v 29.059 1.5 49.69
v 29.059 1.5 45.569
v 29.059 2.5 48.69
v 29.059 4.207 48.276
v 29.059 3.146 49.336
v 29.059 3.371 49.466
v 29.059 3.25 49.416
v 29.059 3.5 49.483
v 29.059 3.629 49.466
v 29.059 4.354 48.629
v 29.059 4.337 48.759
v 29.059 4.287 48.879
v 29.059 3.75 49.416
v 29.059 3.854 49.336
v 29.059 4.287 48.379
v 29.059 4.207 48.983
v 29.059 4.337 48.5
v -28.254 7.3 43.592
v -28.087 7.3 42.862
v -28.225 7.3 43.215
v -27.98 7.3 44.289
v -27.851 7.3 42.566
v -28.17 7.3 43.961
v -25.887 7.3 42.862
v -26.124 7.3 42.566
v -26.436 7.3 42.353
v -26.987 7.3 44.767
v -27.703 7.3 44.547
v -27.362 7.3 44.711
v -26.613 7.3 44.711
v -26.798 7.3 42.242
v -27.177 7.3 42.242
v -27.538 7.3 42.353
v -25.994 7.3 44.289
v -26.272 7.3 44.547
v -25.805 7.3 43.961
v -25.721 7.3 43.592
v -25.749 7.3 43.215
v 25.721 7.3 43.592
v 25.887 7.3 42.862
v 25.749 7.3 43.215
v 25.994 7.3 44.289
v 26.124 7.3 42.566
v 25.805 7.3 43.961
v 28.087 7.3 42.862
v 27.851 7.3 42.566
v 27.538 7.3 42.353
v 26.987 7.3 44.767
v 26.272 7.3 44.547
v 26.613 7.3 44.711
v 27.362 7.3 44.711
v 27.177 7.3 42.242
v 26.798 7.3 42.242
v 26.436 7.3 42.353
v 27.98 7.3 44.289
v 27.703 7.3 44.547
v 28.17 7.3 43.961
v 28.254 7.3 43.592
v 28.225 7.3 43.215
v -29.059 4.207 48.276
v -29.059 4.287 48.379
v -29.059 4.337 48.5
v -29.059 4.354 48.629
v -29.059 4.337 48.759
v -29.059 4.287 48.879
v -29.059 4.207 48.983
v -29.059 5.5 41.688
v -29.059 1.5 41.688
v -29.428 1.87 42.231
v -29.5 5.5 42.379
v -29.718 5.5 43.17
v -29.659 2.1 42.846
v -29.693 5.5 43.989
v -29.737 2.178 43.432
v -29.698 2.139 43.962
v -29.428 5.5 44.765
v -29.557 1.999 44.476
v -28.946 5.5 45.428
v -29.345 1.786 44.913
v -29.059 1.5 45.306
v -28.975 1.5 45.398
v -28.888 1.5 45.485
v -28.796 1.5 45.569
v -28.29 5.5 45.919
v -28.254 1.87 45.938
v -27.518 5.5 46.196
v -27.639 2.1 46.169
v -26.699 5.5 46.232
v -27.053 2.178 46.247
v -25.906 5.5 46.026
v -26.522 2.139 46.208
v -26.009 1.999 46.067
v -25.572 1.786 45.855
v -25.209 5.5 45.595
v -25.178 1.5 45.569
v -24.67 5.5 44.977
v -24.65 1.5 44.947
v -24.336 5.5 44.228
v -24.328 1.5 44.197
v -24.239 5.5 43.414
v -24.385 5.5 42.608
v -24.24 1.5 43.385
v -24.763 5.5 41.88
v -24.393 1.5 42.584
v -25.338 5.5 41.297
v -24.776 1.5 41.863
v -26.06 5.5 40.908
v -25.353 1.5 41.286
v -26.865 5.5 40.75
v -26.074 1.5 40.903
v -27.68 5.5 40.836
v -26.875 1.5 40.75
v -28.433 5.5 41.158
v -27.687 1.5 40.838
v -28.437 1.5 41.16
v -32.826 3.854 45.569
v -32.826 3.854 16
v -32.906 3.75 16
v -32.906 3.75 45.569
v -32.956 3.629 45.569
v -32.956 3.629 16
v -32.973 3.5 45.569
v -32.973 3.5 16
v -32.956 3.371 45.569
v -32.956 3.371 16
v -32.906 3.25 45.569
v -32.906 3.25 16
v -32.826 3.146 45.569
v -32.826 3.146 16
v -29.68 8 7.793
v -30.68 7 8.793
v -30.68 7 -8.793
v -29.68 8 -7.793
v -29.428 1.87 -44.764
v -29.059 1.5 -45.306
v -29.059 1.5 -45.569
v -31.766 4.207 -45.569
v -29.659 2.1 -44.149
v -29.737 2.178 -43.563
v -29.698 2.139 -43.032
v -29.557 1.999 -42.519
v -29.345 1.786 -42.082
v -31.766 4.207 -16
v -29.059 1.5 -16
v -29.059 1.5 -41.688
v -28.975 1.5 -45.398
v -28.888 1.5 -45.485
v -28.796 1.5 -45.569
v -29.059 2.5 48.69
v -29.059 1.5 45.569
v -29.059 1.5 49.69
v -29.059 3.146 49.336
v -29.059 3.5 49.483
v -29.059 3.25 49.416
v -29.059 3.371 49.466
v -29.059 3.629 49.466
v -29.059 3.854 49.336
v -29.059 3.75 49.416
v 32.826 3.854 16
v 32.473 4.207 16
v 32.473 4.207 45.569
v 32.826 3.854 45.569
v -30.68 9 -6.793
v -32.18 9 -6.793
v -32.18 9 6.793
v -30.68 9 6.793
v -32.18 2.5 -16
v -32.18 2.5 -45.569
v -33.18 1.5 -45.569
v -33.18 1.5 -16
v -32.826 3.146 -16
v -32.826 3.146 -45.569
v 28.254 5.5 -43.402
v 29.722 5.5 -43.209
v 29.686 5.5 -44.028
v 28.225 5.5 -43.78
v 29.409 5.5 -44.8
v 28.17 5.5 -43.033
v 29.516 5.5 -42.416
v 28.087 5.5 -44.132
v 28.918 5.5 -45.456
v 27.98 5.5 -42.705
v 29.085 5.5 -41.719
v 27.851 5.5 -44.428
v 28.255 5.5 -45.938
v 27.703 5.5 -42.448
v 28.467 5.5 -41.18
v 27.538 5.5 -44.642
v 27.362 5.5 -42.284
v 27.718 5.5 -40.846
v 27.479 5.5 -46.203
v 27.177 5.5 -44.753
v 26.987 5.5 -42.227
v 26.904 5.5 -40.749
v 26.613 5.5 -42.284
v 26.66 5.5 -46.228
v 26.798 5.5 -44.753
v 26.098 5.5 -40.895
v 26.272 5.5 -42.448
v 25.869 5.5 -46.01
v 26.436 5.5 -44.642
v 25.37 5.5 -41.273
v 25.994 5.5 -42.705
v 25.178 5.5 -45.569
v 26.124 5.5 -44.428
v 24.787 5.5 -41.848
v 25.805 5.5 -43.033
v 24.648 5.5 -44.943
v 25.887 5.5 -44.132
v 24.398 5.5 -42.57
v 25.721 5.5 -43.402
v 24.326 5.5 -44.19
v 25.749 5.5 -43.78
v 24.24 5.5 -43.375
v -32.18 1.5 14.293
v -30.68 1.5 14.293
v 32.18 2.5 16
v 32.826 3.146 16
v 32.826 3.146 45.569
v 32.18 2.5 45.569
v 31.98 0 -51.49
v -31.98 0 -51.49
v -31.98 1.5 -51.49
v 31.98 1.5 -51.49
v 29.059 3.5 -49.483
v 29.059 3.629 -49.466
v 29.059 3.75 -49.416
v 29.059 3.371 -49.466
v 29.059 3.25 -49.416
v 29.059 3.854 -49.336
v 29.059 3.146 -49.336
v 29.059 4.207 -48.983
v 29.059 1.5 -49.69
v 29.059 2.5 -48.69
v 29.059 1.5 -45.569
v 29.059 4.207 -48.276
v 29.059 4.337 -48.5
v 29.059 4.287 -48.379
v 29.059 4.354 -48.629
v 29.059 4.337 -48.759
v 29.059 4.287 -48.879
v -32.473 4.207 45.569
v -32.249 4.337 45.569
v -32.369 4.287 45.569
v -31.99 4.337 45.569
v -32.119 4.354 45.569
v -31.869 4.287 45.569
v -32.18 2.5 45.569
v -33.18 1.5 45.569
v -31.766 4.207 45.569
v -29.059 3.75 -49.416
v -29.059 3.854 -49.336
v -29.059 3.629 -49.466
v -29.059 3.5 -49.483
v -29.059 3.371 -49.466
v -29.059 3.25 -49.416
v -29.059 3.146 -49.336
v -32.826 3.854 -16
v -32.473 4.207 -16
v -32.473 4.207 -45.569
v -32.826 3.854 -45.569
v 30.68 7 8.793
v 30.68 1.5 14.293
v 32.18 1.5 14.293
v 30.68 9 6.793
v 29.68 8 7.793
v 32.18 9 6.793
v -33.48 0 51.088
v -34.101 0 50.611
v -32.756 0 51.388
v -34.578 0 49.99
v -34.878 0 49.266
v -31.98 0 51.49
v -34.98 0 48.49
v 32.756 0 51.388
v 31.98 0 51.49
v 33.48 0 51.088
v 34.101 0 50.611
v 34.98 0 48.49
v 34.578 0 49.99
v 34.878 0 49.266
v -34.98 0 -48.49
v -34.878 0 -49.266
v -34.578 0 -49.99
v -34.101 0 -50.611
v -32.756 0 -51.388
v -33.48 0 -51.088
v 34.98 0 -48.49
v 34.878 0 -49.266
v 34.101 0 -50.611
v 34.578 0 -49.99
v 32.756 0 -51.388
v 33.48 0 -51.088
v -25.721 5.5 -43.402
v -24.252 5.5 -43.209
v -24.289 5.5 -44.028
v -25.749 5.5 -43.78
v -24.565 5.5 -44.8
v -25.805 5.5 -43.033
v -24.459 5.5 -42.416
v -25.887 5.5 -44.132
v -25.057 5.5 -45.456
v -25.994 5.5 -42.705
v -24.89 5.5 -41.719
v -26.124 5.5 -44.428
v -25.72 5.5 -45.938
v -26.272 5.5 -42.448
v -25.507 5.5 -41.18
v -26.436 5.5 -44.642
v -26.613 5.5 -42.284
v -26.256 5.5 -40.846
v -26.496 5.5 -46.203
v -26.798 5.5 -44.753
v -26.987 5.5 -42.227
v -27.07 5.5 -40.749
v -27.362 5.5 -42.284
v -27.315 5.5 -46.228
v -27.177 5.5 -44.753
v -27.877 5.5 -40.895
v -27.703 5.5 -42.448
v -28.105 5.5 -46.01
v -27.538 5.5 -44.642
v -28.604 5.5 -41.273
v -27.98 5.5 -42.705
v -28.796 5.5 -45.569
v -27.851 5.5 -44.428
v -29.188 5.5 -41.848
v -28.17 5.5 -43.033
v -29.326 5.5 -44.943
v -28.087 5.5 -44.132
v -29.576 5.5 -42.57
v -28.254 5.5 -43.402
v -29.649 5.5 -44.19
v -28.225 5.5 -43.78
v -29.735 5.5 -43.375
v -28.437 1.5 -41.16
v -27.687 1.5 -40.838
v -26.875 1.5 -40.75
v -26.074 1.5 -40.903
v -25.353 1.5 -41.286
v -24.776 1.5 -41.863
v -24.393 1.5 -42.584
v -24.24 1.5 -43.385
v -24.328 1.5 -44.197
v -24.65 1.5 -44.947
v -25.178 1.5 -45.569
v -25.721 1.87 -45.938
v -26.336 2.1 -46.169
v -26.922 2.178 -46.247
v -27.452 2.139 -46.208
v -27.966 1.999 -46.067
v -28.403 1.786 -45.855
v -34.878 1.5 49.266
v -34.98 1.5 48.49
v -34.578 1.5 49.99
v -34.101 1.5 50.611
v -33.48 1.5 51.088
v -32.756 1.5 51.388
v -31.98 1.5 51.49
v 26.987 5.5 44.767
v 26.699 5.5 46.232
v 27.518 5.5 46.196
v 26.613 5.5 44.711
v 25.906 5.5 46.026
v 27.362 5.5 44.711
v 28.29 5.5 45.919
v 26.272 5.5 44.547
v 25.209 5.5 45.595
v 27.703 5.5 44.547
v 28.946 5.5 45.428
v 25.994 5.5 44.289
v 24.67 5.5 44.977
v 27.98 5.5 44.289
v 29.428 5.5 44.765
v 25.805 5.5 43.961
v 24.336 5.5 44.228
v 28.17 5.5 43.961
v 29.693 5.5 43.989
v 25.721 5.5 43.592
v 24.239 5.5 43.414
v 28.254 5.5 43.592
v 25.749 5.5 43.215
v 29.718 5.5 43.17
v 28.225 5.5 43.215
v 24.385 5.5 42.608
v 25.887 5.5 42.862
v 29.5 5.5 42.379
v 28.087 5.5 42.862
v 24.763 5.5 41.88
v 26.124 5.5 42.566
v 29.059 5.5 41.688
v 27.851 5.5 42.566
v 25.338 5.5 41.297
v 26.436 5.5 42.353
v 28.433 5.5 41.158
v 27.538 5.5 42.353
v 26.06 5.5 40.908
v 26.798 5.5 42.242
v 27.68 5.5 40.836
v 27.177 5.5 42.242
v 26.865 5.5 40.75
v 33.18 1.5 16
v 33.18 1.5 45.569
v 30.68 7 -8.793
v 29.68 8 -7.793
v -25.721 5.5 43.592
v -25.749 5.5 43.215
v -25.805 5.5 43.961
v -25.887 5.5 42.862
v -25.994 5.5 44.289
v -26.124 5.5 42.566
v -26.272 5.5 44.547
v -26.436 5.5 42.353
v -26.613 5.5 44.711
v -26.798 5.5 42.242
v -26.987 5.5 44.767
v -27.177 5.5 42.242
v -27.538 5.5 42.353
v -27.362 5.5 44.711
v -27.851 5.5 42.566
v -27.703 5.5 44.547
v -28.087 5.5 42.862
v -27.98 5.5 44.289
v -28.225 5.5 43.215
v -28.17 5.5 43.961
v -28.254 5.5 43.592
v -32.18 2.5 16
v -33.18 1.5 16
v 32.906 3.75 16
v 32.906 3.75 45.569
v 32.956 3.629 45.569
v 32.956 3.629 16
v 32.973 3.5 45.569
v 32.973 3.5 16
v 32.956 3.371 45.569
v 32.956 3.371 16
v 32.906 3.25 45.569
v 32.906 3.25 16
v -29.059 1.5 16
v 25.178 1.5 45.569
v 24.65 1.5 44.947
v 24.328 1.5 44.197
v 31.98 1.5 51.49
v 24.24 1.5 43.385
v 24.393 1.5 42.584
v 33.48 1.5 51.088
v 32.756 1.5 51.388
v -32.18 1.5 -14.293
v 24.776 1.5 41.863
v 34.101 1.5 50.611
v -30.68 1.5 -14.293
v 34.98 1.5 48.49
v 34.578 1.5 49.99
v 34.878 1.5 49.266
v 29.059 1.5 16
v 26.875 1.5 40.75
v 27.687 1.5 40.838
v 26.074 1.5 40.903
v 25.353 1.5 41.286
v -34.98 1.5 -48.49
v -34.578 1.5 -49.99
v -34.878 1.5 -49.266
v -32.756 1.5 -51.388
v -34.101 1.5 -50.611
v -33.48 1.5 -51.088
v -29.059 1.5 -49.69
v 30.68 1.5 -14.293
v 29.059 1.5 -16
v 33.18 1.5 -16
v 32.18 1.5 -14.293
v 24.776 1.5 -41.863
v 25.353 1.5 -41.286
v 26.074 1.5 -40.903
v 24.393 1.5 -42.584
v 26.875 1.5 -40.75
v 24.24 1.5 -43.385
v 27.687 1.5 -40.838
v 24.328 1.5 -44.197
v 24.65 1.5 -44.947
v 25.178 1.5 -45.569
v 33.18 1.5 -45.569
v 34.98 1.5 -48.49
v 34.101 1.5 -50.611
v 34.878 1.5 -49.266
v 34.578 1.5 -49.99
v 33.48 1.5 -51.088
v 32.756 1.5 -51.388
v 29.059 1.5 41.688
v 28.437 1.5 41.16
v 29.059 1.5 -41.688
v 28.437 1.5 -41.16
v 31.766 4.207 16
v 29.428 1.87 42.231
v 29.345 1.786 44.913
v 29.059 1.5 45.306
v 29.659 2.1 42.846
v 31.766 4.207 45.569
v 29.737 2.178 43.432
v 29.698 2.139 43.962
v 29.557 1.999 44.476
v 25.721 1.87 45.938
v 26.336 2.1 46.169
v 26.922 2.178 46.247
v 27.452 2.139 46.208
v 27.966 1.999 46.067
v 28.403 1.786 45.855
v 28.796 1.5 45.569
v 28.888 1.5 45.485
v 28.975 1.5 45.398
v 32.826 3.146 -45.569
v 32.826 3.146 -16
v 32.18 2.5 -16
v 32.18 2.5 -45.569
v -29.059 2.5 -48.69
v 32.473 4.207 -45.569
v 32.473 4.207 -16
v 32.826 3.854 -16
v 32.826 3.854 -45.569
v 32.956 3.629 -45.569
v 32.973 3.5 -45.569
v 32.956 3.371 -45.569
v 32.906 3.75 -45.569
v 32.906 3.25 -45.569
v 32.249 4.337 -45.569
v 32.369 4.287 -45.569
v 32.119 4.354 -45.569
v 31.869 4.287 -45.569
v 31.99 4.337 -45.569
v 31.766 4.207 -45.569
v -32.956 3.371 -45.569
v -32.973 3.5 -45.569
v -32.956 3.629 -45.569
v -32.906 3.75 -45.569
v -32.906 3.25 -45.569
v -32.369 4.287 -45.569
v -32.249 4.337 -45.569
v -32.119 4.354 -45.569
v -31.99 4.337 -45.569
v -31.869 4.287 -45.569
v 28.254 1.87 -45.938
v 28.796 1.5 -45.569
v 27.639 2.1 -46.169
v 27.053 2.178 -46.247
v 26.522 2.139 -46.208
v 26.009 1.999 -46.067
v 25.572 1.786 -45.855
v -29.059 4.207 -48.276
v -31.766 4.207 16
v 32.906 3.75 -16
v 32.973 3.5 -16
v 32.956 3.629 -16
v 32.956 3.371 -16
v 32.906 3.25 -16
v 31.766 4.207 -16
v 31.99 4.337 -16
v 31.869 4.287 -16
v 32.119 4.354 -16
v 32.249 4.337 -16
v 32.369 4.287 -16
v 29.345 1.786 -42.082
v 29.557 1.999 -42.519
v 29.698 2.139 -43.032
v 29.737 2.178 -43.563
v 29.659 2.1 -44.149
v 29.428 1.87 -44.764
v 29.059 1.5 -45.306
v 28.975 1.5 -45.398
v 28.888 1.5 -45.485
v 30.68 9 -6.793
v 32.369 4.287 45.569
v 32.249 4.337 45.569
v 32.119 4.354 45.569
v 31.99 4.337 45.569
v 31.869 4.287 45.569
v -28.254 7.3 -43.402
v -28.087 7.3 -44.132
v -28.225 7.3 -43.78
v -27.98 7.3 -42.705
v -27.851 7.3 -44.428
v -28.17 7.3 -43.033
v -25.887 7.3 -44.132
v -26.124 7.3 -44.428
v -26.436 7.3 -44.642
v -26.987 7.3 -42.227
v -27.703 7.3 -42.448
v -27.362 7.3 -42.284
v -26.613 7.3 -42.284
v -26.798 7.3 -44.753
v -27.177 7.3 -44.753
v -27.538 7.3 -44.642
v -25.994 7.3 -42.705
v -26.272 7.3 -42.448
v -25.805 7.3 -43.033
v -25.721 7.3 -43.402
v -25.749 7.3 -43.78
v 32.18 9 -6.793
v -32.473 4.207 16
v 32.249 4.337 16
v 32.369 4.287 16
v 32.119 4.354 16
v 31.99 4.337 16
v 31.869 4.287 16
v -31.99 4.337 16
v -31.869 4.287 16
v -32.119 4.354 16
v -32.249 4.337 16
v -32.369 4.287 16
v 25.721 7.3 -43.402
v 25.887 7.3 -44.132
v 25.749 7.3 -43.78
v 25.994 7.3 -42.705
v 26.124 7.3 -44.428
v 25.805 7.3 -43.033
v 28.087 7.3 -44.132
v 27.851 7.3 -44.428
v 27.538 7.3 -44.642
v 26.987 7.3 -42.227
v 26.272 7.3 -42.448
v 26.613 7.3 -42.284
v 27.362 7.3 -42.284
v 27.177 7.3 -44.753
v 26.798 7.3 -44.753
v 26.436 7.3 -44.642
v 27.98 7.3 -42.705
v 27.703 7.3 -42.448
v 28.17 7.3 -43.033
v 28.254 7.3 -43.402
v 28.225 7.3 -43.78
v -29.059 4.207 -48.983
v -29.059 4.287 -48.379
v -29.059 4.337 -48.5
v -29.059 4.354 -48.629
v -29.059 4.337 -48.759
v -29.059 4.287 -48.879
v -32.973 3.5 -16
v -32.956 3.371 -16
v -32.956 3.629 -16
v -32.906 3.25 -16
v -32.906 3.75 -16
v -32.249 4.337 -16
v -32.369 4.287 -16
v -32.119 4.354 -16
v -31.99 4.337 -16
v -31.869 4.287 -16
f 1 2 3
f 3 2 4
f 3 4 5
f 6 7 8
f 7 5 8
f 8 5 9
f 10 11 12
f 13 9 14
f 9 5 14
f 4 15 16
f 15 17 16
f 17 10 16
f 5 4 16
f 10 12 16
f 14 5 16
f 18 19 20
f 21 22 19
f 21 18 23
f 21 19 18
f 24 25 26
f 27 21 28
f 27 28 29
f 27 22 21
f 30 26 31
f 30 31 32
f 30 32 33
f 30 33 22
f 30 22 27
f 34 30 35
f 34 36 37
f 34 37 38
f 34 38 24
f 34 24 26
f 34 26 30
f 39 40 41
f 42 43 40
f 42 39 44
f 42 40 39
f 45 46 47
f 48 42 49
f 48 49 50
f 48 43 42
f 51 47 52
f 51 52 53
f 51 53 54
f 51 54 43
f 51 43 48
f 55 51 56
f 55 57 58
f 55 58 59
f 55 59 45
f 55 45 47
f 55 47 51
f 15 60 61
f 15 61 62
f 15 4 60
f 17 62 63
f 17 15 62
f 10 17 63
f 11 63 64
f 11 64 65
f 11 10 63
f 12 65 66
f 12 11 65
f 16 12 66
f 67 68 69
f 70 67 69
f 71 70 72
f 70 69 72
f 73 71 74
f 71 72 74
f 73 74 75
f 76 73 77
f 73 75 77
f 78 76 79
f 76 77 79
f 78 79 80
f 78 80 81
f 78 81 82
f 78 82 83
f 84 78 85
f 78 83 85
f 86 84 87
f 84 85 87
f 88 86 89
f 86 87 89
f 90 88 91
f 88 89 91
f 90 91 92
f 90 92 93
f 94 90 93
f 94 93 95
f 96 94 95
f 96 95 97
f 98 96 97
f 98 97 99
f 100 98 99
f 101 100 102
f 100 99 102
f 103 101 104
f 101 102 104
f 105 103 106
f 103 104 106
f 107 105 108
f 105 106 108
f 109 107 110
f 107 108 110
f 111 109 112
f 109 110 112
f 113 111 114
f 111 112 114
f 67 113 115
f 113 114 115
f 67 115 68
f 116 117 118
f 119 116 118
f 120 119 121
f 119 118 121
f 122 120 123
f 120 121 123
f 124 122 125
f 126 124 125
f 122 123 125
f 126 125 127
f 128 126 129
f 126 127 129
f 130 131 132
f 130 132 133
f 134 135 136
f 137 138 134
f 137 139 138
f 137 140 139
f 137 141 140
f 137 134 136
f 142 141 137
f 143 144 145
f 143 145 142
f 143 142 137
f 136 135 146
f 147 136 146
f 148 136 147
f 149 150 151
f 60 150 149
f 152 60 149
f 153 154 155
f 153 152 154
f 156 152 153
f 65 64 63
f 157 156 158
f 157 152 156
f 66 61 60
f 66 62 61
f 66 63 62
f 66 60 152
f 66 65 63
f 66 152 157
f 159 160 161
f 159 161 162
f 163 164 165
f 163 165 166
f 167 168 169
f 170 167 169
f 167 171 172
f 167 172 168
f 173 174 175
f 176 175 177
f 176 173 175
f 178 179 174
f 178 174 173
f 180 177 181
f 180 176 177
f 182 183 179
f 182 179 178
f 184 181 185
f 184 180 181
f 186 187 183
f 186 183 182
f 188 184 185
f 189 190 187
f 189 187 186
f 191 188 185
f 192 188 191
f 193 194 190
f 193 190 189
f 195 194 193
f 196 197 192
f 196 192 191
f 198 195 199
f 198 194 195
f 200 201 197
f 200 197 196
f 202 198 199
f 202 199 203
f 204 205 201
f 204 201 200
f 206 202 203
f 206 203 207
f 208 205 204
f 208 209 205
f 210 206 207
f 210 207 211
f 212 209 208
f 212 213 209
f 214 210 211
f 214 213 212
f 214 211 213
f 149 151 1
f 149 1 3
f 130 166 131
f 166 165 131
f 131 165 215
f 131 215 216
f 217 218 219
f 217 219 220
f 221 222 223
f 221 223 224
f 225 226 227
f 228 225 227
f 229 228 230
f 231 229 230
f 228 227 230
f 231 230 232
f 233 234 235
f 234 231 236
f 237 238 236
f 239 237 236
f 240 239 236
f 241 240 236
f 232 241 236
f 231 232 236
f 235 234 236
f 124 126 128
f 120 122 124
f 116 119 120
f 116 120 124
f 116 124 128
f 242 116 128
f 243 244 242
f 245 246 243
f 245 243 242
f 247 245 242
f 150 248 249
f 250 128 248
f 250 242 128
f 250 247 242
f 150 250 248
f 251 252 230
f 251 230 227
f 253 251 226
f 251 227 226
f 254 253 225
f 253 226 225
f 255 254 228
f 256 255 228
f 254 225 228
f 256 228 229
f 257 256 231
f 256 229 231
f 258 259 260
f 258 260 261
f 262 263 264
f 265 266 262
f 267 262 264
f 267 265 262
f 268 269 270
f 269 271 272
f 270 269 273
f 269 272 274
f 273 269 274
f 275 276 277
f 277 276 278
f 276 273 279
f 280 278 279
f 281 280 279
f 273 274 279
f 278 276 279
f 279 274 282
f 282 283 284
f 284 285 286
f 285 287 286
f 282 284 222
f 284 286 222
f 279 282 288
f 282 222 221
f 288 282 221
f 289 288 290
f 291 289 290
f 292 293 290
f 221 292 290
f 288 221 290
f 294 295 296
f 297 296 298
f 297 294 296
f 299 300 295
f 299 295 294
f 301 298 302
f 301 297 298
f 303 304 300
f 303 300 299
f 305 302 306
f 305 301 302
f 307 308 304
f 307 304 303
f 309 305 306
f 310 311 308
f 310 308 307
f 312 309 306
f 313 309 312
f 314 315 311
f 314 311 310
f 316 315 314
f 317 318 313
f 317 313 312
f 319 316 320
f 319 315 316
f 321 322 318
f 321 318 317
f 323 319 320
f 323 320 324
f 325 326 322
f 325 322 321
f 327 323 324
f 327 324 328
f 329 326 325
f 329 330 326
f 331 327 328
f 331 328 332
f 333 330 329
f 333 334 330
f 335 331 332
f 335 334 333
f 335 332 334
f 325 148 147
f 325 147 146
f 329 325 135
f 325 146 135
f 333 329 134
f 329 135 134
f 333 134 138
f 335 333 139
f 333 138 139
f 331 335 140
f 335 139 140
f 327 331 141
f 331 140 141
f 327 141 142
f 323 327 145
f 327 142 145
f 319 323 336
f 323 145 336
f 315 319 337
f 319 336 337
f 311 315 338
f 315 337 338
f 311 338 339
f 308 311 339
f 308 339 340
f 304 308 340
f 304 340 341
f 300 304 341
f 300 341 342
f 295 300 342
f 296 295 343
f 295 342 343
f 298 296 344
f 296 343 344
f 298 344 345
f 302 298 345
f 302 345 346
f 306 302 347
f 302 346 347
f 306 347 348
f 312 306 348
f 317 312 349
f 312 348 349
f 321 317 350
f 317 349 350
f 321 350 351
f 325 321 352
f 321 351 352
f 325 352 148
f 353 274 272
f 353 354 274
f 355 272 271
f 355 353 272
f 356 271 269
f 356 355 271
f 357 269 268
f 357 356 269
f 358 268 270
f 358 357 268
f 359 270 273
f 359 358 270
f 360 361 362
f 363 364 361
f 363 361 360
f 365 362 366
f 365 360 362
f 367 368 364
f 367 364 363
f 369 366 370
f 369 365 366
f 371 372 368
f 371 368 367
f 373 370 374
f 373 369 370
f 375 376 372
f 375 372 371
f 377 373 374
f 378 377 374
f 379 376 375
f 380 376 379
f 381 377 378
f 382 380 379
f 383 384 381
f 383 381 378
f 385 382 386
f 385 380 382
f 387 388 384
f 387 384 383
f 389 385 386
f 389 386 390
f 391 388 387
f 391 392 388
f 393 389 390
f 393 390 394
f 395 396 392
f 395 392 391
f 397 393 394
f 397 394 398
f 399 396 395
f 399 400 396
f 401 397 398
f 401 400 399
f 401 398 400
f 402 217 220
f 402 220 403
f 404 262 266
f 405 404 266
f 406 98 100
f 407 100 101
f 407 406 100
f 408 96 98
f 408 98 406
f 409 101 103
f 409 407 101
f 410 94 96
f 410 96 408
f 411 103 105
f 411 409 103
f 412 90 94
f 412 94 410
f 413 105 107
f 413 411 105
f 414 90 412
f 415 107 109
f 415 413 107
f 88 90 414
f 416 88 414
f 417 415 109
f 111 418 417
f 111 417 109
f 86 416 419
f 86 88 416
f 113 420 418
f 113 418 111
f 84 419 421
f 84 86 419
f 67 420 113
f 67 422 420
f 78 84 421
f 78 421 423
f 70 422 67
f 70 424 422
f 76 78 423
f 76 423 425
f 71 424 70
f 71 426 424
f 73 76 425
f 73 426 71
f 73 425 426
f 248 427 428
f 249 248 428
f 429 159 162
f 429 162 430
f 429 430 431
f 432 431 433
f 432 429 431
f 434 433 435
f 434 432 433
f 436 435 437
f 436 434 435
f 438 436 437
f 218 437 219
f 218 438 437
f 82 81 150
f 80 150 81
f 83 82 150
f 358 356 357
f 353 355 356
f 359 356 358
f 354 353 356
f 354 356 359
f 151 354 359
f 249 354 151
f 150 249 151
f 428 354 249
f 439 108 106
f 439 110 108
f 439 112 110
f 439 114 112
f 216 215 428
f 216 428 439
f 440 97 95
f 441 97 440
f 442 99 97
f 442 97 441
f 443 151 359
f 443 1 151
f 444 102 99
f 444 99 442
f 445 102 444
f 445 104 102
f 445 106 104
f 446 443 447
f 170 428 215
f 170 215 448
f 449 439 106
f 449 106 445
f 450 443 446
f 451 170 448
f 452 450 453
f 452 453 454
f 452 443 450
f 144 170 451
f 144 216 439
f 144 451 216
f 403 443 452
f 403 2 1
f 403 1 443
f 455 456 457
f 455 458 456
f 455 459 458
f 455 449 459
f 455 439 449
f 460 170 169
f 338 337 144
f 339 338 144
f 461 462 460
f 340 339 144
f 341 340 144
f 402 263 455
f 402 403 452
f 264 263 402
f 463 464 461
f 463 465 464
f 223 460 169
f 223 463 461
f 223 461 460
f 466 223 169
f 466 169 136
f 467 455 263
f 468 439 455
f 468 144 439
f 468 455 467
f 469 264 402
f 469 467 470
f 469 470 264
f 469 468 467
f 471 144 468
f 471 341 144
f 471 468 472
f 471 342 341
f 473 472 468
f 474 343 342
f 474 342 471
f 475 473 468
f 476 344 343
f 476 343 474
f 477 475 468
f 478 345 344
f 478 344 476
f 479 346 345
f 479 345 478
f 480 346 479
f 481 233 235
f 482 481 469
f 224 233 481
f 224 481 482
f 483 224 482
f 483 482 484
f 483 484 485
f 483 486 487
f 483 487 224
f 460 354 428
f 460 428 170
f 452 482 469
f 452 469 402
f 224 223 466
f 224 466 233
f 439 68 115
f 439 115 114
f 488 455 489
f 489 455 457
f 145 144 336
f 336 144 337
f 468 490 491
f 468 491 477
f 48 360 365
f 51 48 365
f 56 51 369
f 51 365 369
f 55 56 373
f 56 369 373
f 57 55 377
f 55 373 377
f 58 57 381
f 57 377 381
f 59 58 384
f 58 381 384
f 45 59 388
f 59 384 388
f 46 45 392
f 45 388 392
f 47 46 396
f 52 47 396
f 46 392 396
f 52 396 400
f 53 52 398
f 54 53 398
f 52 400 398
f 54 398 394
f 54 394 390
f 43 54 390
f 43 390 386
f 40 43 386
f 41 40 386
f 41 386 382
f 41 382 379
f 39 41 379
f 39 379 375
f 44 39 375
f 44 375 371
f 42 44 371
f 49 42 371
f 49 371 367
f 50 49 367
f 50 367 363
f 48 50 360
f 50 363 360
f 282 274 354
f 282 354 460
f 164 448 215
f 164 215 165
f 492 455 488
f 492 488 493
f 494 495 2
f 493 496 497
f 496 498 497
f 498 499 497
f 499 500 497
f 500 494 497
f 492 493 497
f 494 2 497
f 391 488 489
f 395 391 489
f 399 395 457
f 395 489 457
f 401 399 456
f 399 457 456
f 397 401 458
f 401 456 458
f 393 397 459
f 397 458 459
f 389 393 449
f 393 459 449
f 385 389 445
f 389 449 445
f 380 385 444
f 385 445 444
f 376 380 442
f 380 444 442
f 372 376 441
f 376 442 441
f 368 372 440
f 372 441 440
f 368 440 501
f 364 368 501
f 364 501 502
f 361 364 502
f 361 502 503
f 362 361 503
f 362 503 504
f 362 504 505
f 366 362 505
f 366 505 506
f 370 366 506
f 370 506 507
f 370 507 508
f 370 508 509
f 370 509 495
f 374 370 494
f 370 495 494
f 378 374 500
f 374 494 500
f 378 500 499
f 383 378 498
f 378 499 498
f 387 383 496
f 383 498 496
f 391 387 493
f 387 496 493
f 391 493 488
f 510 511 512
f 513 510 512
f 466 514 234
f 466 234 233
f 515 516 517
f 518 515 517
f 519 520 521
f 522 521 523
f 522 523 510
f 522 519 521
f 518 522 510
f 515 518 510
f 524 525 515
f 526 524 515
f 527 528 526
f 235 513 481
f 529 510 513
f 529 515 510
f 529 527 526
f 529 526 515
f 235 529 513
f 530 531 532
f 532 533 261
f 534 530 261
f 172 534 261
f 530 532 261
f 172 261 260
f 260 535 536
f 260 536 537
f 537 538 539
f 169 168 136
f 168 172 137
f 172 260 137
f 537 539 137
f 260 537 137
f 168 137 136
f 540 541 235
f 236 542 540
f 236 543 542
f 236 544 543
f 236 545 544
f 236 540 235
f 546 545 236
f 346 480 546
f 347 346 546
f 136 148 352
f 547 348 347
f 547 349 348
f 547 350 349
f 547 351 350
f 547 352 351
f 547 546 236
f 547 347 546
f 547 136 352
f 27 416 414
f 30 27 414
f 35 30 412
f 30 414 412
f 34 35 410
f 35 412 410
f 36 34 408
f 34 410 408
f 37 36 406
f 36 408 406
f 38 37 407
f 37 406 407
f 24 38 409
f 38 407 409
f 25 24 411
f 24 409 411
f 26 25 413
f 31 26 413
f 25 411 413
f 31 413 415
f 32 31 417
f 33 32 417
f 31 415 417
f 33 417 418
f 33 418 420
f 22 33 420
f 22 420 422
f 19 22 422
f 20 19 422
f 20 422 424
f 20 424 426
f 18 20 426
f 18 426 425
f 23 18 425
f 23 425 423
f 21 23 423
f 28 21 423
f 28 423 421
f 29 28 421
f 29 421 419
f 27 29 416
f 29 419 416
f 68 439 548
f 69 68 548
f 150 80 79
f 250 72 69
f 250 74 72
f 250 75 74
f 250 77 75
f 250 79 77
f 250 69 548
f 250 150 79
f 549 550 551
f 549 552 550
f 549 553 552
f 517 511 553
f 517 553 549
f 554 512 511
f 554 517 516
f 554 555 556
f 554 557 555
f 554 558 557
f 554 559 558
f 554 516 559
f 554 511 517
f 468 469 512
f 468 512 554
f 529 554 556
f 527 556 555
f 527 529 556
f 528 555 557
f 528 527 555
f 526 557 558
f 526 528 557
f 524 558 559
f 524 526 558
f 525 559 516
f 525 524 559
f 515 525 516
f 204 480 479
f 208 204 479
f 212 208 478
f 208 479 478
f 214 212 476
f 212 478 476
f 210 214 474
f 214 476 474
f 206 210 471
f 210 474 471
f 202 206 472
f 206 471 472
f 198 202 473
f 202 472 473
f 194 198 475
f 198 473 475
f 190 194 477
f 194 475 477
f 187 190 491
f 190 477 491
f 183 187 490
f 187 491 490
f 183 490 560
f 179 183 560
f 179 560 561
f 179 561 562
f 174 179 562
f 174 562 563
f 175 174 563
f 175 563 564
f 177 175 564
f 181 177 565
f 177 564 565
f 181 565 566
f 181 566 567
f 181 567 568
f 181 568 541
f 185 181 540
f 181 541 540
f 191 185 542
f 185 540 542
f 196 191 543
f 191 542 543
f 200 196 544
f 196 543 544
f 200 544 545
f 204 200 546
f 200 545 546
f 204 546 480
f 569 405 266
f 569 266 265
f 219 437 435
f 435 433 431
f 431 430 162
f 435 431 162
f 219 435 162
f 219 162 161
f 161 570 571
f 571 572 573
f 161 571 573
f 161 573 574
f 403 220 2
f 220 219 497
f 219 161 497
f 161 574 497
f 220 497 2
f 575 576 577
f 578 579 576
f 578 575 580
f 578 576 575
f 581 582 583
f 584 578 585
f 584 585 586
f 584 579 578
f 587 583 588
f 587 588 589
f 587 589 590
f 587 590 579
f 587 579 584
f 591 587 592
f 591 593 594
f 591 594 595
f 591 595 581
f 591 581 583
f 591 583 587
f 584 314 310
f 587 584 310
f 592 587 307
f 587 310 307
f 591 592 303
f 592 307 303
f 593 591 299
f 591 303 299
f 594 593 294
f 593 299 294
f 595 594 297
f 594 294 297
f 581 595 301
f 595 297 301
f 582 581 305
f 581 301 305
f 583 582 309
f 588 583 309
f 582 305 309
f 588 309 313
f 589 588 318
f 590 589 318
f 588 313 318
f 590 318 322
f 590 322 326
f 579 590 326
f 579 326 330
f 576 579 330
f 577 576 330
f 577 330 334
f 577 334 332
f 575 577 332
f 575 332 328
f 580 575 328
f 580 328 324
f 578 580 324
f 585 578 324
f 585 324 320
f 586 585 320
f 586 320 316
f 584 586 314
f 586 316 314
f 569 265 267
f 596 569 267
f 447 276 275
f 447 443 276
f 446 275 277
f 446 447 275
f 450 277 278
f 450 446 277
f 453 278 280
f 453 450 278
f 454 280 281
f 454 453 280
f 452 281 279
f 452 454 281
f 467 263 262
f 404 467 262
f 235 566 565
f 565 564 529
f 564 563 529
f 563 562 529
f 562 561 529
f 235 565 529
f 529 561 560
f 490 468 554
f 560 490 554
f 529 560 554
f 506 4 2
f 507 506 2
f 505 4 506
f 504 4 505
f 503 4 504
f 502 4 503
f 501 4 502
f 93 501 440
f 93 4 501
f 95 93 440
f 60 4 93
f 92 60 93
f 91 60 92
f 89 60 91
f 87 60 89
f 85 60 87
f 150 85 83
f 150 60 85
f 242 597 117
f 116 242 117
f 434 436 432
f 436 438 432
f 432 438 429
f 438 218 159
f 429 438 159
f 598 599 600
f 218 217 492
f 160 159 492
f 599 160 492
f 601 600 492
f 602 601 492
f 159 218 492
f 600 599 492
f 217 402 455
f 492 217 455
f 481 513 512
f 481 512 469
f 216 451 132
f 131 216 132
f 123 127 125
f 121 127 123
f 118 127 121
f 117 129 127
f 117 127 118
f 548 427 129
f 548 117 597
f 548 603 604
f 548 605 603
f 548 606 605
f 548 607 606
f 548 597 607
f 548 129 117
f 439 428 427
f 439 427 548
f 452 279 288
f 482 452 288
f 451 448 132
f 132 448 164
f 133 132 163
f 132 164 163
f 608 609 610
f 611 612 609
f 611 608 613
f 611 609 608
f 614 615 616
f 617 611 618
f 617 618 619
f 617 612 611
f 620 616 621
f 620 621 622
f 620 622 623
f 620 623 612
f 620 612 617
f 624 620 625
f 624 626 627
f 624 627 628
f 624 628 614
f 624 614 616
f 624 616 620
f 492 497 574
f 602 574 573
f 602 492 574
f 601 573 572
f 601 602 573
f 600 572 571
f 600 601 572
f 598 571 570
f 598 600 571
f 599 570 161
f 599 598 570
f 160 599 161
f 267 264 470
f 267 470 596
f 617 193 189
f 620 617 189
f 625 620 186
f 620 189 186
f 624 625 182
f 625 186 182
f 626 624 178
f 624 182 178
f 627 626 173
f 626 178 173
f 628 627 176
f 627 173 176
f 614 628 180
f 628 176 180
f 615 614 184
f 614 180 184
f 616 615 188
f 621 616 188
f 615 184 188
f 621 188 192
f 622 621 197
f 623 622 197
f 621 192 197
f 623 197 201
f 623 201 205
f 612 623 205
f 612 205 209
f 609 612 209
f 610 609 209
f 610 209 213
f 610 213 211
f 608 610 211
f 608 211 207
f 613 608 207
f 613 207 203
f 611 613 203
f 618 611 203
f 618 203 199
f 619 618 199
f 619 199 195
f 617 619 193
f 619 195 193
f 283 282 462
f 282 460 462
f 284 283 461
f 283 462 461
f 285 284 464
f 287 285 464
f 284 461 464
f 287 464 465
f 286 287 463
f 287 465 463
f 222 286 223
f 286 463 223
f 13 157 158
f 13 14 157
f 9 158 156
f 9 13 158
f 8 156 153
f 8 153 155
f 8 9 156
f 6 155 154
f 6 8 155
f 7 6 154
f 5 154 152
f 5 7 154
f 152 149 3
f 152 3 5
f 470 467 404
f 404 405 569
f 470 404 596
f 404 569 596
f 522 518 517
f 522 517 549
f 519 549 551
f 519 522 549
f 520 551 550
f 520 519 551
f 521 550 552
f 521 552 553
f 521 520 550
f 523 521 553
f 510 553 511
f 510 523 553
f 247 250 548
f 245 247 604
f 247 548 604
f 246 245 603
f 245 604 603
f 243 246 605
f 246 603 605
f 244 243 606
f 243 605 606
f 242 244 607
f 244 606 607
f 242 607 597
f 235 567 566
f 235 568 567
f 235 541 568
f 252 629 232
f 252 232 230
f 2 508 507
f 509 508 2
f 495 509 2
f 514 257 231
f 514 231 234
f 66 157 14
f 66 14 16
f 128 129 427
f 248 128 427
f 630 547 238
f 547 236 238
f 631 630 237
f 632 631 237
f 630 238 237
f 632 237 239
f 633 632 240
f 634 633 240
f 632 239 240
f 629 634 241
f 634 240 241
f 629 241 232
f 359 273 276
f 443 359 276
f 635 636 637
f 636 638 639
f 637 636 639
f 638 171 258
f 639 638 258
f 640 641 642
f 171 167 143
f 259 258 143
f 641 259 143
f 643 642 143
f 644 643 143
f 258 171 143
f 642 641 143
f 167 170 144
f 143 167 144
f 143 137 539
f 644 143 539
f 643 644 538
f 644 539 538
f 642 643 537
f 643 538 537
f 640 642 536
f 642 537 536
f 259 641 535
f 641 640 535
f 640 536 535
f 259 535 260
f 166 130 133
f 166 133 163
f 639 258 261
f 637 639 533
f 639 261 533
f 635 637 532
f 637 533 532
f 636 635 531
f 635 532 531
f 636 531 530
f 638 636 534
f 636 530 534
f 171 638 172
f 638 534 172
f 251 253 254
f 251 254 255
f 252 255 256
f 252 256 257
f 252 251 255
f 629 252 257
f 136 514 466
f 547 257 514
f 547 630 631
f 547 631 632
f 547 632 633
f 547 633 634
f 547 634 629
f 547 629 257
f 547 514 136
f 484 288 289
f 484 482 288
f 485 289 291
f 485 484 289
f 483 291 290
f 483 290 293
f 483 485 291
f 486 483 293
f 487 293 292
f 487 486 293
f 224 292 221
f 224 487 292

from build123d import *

# Parameters (mm, degrees)
EDIT_GLOBAL_VARIABLE_WITH_PCB_DIMENSIONS_W = 69.96
EDIT_GLOBAL_VARIABLE_WITH_PCB_DIMENSIONS_H = 102.98
BOSS_EXTRUDE1_DEPTH                        = 1.5
FILLET1_R                                  = 3
BOSS_EXTRUDE2_DEPTH                        = 91.1374
BOSS_EXTRUDE3_DEPTH                        = 91.1374
BOSS_EXTRUDE4_DEPTH                        = 58.1174
BOSS_EXTRUDE5_DEPTH                        = 58.1174
FILLET2_R                                  = 0.5
SKETCH7_W                                  = 32
SKETCH7_H                                  = 2.853553391
CUT_EXTRUDE1_DEPTH                         = 35.98
CUT_EXTRUDE1_DEPTH_BACK                    = 35.98
SKETCH8_R                                  = 2.75
BOSS_EXTRUDE6_DEPTH                        = 4
SKETCH11_W                                 = 1.5
SKETCH11_H                                 = 7.5002
BOSS_EXTRUDE8_DEPTH                        = 14.29325
BOSS_EXTRUDE9_DEPTH                        = 14.29325
CHAMFER1_SIZE                              = 7.5
SKETCH10_R                                 = 1.27
BOSS_EXTRUDE10_DEPTH                       = 1.8002


with BuildPart() as part:
    # EDIT GLOBAL VARIABLE WITH PCB DIMENSIONS → Boss-Extrude1 (new body)
    with BuildSketch(Plane(origin=(0, 0, 0), x_dir=(1, 0, 0), z_dir=(0, 1, 0))):
        Rectangle(EDIT_GLOBAL_VARIABLE_WITH_PCB_DIMENSIONS_W, EDIT_GLOBAL_VARIABLE_WITH_PCB_DIMENSIONS_H)
    extrude(amount=BOSS_EXTRUDE1_DEPTH)

    # Fillet1
    fillet1_edges = [part.edges().sort_by_distance(p)[0] for p in [
        (34.98, 0.75, 51.49),
        (-34.98, 0.75, 51.49),
        (-34.98, 0.75, -51.49),
        (34.98, 0.75, -51.49),
    ]]
    fillet(fillet1_edges, radius=FILLET1_R)

    # Sketch2 → Boss-Extrude2 (add)
    with BuildSketch(Plane.XY.offset(45.5687)):
        Polygon((33.18, 1.5), (29.058679656, 1.5), (32.119339828, 4.560660172), (33.18, 3.5), (32.18, 2.5), align=None)
    extrude(amount=-BOSS_EXTRUDE2_DEPTH)

    # Sketch3 → Boss-Extrude3 (add)
    with BuildSketch(Plane.XY.offset(45.5687)):
        Polygon((-33.18, 1.5), (-29.058679656, 1.5), (-32.119339828, 4.560660172), (-33.18, 3.5), (-32.18, 2.5), align=None)
    extrude(amount=-BOSS_EXTRUDE3_DEPTH)

    # Sketch4 → Boss-Extrude4 (add)
    with BuildSketch(Plane.ZY.offset(29.0587)):
        Polygon((-49.69, 1.5), (-45.568679656, 1.5), (-48.629339828, 4.560660172), (-49.69, 3.5), (-48.69, 2.5), align=None)
    extrude(amount=-BOSS_EXTRUDE4_DEPTH)

    # Sketch5 → Boss-Extrude5 (add)
    with BuildSketch(Plane.ZY.offset(29.0587)):
        Polygon((45.568679656, 1.5), (49.69, 1.5), (48.69, 2.5), (49.69, 3.5), (48.629339828, 4.560660172), align=None)
    extrude(amount=-BOSS_EXTRUDE5_DEPTH)

    # Fillet2
    fillet2_edges = [part.edges().sort_by_distance(p)[0] for p in [
        (33.18, 3.5, 0),
        (32.119339828, 4.560660172, 0),
        (-32.119339828, 4.560660172, 0),
        (-33.18, 3.5, 0),
        (0, 4.560660172, -48.629339828),
        (0, 3.5, -49.69),
        (0, 3.5, 49.69),
        (0, 4.560660172, 48.629339828),
    ]]
    fillet(fillet2_edges, radius=FILLET2_R)

    # Sketch7 → Cut-Extrude1 (cut, two sides)
    with BuildSketch(Plane(origin=(0, 0, 0), x_dir=(0, 0, -1), z_dir=(1, 0, 0))) as cut_extrude1_sk:
        with Locations((0, 2.926776696)):
            Rectangle(SKETCH7_W, SKETCH7_H)
    extrude(amount=CUT_EXTRUDE1_DEPTH, mode=Mode.SUBTRACT)
    extrude(cut_extrude1_sk.sketch, amount=-CUT_EXTRUDE1_DEPTH_BACK, mode=Mode.SUBTRACT)

    # Sketch8 → Boss-Extrude6 (add)
    with BuildSketch(Plane(origin=(0, 1.5, 0), x_dir=(1, 0, 0), z_dir=(0, 1, 0))):
        with Locations(Location((-26.98732474, 43.49732474, 0), (0, 0, 131.129923219))):  # turned: the seam where the file's is
            Circle(SKETCH8_R)
        with Locations(Location((26.98732474, 43.49732474, 0), (0, 0, 131.129923219))):  # turned: the seam where the file's is
            Circle(SKETCH8_R)
        with Locations(Location((-26.98732474, -43.49732474, 0), (0, 0, 138.870076781))):  # turned: the seam where the file's is
            Circle(SKETCH8_R)
        with Locations(Location((26.98732474, -43.49732474, 0), (0, 0, 41.129923219))):  # turned: the seam where the file's is
            Circle(SKETCH8_R)
    extrude(amount=BOSS_EXTRUDE6_DEPTH)

    # Sketch11 → Boss-Extrude8 (add, symmetric)
    with BuildSketch(Plane.XY):
        with Locations((-31.43, 5.2501)):
            Rectangle(SKETCH11_W, SKETCH11_H)
        with Locations((31.43, 5.2501)):
            Rectangle(SKETCH11_W, SKETCH11_H)
    extrude(amount=BOSS_EXTRUDE8_DEPTH, both=True)

    # Sketch12 → Boss-Extrude9 (add, symmetric)
    with BuildSketch(Plane.XY):
        Polygon((30.68, 9.0002), (30.68, 7.0002), (29.68, 8.0002), align=None)
        Polygon((-30.68, 9.0002), (-30.68, 7.0002), (-29.68, 8.0002), align=None)
    extrude(amount=BOSS_EXTRUDE9_DEPTH, both=True)

    # Chamfer1
    chamfer1_edges = [part.edges().sort_by_distance(p)[0] for p in [
        (31.43, 9.0002, -14.29325),
        (31.43, 9.0002, 14.29325),
        (-31.43, 9.0002, -14.29325),
        (-31.43, 9.0002, 14.29325),
    ]]
    chamfer(chamfer1_edges, length=CHAMFER1_SIZE)

    # Sketch10 → Boss-Extrude10 (add)
    with BuildSketch(Plane(origin=(0, 5.5, 0), x_dir=(1, 0, 0), z_dir=(0, 1, 0))):
        with Locations(Location((-26.98732474, 43.49732474, 0), (0, 0, 270))):  # turned: the seam where the file's is
            Circle(SKETCH10_R)
        with Locations(Location((26.98732474, 43.49732474, 0), (0, 0, 270))):  # turned: the seam where the file's is
            Circle(SKETCH10_R)
        with Locations(Location((26.98732474, -43.49732474, 0), (0, 0, 270))):  # turned: the seam where the file's is
            Circle(SKETCH10_R)
        with Locations(Location((-26.98732474, -43.49732474, 0), (0, 0, 270))):  # turned: the seam where the file's is
            Circle(SKETCH10_R)
    extrude(amount=BOSS_EXTRUDE10_DEPTH)


solid = part.part
